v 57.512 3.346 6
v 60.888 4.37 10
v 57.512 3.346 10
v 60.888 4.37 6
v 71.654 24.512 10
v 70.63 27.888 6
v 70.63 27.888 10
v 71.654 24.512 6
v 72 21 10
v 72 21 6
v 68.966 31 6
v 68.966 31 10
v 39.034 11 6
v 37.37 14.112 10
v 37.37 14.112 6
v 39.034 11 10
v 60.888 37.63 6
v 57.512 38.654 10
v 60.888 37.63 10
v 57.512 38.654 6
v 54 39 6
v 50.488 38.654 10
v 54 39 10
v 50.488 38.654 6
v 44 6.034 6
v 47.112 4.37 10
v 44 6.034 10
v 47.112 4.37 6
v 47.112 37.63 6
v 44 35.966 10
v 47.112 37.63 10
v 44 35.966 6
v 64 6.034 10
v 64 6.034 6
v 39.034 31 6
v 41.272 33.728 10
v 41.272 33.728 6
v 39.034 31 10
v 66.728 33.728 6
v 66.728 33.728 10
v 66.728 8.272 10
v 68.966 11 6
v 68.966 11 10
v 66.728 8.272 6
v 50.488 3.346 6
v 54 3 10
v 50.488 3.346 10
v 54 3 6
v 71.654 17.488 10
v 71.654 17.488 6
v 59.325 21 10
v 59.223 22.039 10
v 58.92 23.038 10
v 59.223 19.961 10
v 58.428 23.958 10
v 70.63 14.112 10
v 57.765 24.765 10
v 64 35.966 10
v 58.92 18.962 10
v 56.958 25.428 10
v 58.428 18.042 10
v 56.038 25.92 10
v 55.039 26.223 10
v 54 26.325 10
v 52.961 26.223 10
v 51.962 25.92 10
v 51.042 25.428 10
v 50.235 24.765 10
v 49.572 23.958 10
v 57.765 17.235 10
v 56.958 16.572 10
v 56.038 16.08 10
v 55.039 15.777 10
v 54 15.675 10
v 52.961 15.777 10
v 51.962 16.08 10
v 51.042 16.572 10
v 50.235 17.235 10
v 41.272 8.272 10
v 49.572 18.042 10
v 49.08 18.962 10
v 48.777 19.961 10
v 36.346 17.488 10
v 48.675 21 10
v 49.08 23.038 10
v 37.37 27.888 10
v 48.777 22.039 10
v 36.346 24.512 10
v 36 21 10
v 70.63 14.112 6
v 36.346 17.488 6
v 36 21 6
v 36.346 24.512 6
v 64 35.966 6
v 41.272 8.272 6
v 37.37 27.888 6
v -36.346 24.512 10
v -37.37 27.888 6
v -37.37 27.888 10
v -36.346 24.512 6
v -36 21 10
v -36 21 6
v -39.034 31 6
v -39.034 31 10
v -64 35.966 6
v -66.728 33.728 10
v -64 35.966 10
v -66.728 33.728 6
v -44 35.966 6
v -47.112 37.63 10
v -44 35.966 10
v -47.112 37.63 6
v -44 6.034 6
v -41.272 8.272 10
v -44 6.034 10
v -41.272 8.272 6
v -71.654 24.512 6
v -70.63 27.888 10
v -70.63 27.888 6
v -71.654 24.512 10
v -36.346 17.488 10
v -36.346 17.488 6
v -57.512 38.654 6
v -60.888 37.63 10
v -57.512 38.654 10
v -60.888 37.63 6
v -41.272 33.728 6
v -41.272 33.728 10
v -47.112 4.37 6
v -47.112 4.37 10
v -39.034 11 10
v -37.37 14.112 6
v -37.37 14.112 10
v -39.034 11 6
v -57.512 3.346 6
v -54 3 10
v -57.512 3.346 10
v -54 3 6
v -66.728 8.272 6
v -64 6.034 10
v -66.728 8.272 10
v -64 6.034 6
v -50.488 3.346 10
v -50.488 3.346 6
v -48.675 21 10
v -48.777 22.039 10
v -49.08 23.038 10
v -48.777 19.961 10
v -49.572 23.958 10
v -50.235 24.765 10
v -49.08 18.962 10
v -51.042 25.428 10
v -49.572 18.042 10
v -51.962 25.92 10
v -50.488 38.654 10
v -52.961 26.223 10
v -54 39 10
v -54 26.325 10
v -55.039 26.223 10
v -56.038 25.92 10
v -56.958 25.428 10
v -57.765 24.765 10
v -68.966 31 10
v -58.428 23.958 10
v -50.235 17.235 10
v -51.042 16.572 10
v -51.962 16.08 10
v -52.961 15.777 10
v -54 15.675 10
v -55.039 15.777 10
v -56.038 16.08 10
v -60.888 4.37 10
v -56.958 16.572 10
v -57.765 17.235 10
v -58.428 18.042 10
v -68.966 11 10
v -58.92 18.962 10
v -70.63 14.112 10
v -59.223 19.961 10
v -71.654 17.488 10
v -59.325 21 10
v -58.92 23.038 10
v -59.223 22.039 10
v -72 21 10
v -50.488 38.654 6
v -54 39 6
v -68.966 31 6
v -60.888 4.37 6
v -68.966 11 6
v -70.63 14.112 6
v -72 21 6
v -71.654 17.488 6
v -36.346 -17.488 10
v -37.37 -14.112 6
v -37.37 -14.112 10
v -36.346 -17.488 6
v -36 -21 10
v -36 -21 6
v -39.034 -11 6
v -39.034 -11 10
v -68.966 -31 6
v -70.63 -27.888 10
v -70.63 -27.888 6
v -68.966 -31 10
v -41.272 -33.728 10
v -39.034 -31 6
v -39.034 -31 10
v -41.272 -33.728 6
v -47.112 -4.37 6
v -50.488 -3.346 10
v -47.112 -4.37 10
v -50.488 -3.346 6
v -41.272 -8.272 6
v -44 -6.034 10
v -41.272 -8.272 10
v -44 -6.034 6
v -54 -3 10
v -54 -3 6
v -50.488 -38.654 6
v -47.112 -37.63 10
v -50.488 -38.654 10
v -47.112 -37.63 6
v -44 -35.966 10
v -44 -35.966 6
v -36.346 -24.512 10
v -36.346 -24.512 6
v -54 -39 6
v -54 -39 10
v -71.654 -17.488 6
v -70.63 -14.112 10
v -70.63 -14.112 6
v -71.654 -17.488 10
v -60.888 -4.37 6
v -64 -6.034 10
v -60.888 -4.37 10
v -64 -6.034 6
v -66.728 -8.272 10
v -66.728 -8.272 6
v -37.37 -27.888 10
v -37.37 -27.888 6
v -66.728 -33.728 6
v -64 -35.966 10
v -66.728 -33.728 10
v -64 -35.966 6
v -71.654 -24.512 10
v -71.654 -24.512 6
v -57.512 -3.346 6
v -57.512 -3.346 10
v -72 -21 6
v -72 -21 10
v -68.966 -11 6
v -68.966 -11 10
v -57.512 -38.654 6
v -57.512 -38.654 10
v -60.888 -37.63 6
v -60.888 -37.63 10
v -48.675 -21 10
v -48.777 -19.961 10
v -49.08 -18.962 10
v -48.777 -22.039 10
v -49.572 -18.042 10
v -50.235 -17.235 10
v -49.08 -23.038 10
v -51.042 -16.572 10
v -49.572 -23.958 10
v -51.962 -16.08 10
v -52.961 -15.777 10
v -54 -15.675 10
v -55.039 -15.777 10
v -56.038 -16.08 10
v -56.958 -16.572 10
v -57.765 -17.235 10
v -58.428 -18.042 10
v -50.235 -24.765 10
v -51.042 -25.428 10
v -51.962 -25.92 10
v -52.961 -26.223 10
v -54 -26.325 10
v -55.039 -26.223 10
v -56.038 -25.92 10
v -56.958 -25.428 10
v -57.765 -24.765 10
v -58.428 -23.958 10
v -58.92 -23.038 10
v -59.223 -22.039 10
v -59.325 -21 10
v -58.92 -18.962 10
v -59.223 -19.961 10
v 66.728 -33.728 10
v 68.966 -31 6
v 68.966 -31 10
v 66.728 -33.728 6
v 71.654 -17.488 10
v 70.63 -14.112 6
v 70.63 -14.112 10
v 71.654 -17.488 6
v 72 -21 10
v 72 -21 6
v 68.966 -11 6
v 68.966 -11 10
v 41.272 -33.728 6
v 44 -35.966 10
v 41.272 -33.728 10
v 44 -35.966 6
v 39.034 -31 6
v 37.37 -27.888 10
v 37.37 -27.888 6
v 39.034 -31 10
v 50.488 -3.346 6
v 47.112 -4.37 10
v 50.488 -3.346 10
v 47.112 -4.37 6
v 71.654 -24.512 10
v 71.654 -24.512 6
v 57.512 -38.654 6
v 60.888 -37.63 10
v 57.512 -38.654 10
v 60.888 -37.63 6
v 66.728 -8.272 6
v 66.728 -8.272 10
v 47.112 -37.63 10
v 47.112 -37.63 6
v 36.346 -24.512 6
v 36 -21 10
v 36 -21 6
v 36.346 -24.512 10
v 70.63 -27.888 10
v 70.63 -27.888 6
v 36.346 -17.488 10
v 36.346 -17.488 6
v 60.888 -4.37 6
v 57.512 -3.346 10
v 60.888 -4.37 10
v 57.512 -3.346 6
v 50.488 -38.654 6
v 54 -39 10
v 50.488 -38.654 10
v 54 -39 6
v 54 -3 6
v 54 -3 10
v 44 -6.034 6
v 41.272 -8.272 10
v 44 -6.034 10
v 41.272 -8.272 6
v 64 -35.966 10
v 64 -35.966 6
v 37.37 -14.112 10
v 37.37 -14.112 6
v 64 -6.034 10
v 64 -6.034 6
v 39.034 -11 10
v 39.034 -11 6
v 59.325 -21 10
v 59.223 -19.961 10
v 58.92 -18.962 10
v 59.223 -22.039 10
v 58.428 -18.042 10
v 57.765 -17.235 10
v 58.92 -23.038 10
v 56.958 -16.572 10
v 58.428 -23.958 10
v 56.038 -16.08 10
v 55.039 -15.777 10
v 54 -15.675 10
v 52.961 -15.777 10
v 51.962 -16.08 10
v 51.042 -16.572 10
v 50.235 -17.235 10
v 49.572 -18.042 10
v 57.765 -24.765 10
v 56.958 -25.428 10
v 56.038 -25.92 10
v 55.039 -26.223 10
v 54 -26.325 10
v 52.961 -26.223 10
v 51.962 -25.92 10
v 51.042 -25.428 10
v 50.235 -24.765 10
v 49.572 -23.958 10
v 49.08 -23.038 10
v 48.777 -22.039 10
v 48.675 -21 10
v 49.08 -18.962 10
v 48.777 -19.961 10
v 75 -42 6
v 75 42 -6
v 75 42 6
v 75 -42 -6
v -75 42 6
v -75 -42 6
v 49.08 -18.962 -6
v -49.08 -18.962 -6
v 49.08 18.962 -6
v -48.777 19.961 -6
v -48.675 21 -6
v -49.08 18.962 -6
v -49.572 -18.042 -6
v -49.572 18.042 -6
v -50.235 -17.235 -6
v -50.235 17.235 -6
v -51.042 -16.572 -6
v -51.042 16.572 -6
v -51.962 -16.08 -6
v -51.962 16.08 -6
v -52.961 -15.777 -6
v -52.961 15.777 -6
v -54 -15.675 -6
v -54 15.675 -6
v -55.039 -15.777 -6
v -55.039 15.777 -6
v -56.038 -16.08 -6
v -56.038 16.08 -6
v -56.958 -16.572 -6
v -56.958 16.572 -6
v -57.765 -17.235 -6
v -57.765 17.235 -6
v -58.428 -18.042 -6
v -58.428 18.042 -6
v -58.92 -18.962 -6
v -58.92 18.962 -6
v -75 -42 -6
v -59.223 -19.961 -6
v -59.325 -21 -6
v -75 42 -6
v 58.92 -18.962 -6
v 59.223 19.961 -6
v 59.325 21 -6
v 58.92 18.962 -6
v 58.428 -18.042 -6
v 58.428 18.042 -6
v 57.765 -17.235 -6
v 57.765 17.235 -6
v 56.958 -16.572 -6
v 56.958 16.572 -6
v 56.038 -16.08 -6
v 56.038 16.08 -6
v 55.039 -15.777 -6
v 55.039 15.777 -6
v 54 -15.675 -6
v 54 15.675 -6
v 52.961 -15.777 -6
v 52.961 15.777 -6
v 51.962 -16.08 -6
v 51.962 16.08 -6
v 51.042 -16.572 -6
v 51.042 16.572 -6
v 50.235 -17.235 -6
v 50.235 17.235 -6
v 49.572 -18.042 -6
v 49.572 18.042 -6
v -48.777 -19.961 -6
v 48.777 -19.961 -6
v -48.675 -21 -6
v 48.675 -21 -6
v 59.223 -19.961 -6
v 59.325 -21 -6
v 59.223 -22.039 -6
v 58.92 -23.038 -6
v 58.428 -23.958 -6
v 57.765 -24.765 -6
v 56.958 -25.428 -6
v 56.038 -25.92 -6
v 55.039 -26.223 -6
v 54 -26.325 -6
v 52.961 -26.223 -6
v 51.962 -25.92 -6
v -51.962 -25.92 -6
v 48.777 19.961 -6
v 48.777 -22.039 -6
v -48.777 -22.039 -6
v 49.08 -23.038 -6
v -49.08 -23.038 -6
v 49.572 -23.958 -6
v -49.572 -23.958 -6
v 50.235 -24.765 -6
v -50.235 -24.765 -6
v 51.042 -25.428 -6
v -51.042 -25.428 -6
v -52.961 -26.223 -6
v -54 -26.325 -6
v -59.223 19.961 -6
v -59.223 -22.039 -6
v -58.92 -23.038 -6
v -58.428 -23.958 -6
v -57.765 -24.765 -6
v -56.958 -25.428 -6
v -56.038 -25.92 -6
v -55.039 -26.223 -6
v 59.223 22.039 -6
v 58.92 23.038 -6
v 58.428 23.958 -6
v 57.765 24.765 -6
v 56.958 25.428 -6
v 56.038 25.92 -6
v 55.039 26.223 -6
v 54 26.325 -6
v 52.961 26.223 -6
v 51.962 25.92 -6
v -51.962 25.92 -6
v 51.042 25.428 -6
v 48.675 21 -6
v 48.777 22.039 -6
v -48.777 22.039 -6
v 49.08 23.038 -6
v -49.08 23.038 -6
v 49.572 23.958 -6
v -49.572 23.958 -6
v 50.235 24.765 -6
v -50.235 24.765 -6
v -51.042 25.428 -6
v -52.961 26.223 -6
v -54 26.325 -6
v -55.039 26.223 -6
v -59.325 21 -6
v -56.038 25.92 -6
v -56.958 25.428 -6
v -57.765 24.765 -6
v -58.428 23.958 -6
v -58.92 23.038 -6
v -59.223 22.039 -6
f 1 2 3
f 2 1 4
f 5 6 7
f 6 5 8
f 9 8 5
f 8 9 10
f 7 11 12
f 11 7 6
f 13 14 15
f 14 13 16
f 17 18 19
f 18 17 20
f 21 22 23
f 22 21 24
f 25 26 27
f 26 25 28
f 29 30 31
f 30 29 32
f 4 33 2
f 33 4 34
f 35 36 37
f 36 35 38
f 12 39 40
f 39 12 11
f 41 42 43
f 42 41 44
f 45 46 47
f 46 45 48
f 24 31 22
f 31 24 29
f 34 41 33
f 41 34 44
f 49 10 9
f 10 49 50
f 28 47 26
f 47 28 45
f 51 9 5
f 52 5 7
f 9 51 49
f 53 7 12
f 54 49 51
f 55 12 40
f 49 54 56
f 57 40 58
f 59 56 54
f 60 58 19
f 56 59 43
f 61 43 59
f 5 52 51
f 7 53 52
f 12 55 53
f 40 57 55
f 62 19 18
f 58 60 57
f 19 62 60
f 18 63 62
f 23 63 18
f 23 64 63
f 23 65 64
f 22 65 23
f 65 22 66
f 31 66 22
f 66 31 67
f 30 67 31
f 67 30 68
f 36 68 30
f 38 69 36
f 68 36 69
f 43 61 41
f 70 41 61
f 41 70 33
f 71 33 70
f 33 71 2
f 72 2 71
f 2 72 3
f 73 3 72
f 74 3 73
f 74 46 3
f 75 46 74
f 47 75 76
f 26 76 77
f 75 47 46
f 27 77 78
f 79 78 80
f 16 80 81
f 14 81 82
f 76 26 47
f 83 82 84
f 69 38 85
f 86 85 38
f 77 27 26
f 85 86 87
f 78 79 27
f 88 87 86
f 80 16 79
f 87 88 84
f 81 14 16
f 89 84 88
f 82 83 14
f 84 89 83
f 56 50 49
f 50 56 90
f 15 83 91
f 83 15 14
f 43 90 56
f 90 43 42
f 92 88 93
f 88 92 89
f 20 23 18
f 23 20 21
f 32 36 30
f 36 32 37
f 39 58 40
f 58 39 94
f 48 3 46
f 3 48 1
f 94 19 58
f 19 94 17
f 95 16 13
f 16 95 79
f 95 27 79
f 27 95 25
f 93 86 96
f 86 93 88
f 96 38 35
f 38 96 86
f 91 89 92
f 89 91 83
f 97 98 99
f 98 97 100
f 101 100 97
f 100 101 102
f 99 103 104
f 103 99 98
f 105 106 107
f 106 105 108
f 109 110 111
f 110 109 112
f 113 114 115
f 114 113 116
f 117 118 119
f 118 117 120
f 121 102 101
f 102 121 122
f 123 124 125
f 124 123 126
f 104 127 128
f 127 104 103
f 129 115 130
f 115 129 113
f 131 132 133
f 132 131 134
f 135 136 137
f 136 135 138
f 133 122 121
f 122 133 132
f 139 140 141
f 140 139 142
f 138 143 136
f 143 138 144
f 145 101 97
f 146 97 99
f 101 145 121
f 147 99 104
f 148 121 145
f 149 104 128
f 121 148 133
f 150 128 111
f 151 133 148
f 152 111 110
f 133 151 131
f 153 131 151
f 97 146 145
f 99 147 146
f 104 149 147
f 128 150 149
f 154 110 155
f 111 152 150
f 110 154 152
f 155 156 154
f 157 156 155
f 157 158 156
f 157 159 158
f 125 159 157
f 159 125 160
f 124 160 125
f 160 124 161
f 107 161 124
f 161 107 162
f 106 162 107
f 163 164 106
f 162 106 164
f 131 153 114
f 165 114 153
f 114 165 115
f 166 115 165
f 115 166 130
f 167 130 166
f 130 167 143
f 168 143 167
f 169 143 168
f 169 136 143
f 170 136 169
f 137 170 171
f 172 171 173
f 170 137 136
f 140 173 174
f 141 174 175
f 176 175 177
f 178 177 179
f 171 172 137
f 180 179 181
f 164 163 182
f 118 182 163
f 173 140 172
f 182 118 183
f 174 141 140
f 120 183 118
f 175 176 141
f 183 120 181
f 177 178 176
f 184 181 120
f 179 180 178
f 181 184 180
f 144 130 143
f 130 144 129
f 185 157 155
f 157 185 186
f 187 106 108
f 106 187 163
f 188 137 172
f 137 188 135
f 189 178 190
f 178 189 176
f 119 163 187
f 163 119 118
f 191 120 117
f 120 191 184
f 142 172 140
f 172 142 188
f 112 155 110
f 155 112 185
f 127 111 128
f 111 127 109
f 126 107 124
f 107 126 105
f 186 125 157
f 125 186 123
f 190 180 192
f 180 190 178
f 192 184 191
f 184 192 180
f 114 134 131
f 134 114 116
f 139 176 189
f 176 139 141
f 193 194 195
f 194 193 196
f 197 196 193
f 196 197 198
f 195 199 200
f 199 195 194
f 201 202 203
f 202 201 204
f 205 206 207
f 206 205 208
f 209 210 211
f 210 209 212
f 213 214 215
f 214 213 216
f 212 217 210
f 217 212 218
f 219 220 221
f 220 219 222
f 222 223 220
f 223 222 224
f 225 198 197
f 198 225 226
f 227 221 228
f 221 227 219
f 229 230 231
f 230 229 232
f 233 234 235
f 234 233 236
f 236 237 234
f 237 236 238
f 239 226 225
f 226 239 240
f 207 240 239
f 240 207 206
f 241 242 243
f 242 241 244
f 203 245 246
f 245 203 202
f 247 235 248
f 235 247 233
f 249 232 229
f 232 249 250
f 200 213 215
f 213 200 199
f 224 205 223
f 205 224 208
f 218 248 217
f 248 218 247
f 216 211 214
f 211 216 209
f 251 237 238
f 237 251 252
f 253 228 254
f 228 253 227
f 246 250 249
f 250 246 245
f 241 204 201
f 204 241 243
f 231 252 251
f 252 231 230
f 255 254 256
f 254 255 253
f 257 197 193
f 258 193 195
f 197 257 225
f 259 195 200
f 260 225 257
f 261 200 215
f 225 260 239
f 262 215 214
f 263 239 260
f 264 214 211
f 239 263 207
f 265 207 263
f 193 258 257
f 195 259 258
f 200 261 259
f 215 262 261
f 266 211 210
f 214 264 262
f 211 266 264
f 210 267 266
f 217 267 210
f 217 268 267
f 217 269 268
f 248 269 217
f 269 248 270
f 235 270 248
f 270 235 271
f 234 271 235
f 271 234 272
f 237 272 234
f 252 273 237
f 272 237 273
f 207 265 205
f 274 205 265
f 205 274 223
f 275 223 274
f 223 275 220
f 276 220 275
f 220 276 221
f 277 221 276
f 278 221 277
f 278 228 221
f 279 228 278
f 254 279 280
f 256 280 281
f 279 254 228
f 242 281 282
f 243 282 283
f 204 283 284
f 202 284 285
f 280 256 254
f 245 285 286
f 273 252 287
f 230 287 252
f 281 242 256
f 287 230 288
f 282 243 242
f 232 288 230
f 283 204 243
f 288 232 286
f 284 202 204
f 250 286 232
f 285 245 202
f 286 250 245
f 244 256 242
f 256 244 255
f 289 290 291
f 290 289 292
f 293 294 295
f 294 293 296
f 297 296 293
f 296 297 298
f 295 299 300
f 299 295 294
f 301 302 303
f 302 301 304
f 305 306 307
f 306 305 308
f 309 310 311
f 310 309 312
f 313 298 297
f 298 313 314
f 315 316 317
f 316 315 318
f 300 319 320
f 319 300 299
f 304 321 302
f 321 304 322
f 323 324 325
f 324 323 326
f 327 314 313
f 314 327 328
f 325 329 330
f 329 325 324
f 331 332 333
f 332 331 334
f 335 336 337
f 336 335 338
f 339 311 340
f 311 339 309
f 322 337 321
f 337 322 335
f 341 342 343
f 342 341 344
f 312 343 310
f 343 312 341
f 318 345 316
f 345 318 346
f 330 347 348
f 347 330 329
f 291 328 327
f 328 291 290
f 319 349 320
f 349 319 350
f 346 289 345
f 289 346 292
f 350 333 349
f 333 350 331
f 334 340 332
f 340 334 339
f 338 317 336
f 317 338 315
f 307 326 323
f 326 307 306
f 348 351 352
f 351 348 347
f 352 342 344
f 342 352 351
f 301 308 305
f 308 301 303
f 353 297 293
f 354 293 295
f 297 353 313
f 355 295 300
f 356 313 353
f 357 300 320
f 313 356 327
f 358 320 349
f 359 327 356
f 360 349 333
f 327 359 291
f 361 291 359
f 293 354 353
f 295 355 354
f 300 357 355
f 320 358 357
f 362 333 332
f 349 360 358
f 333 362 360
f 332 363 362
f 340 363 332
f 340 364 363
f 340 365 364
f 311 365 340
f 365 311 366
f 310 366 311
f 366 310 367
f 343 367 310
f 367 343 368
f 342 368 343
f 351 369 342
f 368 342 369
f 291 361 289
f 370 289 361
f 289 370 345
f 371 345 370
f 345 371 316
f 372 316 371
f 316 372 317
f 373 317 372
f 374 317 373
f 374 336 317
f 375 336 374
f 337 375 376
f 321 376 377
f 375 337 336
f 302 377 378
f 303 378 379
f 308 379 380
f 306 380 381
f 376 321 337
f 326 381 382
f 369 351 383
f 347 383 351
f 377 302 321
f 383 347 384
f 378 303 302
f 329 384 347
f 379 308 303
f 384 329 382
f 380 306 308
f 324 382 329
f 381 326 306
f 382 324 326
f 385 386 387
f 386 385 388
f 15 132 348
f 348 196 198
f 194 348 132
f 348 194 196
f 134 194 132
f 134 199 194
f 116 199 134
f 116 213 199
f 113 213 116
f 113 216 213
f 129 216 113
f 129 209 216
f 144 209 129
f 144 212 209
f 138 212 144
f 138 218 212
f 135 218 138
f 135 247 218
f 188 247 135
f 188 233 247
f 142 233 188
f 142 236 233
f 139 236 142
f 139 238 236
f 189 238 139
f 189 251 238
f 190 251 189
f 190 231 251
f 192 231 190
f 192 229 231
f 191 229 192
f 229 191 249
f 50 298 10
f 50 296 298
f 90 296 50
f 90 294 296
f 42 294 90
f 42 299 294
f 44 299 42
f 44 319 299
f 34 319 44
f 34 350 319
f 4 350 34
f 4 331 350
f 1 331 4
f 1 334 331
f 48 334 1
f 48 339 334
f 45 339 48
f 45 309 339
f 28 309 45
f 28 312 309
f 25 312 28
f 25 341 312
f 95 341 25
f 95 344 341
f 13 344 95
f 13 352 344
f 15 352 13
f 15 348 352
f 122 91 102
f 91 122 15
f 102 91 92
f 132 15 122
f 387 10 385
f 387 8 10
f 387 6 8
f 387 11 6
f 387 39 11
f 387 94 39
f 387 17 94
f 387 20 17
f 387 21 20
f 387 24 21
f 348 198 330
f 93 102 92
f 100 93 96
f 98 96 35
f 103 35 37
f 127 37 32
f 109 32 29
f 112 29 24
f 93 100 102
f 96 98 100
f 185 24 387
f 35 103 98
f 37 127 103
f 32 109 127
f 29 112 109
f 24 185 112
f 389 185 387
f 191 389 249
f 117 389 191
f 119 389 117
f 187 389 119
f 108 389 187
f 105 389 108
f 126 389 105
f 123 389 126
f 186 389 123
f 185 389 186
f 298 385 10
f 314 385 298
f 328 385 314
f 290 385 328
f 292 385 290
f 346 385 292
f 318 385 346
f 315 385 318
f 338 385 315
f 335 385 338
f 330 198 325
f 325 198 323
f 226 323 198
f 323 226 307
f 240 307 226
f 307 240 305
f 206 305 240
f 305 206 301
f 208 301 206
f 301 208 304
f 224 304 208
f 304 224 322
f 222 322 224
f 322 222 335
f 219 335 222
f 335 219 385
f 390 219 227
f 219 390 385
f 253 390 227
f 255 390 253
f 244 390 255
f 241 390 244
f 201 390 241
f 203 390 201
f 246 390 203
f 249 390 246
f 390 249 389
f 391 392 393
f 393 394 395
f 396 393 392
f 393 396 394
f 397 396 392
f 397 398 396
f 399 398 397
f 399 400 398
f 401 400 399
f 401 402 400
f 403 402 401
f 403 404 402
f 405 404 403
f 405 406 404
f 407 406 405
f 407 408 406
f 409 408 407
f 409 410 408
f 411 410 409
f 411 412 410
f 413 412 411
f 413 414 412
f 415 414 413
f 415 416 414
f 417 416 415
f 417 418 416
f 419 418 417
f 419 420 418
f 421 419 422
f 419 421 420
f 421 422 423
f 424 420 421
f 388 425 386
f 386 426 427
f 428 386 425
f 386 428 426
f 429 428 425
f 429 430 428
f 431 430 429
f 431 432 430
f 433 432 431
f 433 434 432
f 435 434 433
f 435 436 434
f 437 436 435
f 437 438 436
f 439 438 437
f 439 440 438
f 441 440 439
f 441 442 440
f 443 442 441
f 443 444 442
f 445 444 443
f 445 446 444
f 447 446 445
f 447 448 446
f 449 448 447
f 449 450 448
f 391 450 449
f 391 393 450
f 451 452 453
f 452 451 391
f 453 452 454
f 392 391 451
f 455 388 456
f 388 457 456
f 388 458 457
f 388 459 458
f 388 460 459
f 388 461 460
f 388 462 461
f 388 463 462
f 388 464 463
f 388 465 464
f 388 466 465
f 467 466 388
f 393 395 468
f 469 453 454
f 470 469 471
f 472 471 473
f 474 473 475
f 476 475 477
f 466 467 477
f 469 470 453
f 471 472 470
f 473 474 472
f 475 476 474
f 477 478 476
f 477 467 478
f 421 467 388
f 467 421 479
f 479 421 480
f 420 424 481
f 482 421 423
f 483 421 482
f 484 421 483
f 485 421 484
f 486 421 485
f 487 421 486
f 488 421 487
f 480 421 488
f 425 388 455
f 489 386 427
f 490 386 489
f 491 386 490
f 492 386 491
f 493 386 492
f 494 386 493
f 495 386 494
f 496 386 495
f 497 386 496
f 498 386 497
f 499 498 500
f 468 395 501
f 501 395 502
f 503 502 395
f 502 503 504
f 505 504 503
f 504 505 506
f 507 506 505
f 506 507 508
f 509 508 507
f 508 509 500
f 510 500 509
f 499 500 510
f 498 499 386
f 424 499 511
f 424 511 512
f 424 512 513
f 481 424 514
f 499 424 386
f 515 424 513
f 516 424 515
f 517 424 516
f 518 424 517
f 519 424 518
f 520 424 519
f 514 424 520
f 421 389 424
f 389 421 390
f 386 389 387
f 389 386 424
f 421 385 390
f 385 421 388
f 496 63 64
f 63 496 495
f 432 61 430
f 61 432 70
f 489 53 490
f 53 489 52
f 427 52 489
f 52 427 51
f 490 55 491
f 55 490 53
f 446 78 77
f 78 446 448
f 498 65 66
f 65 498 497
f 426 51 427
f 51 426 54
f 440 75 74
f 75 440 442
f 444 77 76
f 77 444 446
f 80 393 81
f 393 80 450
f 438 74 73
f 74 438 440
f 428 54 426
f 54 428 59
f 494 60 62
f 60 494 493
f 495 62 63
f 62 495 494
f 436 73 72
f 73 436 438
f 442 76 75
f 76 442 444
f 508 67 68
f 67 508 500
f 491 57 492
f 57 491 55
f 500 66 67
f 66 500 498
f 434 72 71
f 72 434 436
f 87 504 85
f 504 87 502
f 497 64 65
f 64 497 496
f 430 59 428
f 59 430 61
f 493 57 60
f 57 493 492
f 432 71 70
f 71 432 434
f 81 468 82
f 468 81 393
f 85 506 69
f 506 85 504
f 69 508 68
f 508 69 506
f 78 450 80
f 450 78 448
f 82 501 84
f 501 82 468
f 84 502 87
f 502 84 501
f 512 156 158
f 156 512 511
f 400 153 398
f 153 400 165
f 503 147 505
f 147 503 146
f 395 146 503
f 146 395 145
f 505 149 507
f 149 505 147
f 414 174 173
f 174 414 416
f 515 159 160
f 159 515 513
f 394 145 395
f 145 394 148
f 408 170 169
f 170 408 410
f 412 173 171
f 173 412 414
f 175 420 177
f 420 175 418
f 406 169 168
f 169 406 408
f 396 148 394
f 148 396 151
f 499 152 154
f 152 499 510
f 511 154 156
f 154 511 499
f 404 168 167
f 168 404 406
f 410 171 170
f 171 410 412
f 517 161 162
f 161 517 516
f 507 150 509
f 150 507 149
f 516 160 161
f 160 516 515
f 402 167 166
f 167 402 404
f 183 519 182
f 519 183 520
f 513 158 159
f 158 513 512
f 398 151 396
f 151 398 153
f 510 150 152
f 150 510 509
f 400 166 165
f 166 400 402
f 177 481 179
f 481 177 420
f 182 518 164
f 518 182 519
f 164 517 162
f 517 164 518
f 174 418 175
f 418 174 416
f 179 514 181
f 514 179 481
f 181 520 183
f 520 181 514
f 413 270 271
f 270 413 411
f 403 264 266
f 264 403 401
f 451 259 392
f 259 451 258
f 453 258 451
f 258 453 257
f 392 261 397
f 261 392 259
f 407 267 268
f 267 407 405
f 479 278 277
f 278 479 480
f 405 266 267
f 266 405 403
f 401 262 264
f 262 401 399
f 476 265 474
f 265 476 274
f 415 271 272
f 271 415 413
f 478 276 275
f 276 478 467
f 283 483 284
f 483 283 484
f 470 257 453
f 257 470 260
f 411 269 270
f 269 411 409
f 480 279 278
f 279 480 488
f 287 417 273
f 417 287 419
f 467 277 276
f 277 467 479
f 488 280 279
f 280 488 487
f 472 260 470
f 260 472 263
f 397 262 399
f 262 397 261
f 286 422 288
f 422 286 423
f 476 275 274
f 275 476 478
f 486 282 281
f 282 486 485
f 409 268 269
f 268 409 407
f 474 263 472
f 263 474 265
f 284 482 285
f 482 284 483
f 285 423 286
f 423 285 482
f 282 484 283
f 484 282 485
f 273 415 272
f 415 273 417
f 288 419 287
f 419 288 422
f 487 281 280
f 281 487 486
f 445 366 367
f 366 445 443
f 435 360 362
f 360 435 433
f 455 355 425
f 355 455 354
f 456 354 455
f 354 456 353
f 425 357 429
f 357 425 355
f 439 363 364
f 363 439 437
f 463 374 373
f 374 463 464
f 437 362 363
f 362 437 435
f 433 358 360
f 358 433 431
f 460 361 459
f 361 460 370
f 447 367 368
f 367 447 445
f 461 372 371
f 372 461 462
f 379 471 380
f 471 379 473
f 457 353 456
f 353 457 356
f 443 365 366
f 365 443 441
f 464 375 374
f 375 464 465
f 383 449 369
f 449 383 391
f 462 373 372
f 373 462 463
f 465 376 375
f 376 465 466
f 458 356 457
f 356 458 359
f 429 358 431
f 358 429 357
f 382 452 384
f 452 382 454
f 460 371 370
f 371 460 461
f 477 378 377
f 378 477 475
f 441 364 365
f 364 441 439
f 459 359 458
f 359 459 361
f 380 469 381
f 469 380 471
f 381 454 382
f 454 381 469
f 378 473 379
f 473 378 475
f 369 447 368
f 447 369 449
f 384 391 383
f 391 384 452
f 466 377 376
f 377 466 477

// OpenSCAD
$fn = 32;

// ----------------------------------------------------------------------
// Anchor pads 150 x 84 x 16
// four corner bosses with anchor holes
// ----------------------------------------------------------------------

// --- parameters (mm) ---
plate = [150, 84, 12];   // base plate size (x, y, z)
pads = 4;                // boss count, one per corner
edge = 21;               // boss centre offset from the plate edge
boss_d = 36;             // boss diameter
boss_h = 4;              // boss height above the base plate
bore_d = 10.5;           // nominal hole diameter from the drawing
print_allowance = 0.15;  // clearance added for printing

// --- derived feature positions (mm) ---
hole_d = bore_d + print_allowance;  // = 10.65   hole diameter as printed
height = plate[2] + boss_h;         // = 16   overall height of the part
corner_x = plate[0] / 2 - edge;     // = 54   boss centre X
corner_y = plate[1] / 2 - edge;     // = 21   boss centre Y
feature_centers = [
  [corner_x, corner_y],
  [-corner_x, corner_y],
  [-corner_x, -corner_y],
  [corner_x, -corner_y]
];   // boss centres, anchor holes are drilled there

// base plate, four bosses standing on it, anchor holes all the way through
difference() {
  union() {
    cube(plate, center = true);
    for (centre = feature_centers)
      translate([centre[0], centre[1], plate[2] / 2 - 1])
        cylinder(d = boss_d, h = boss_h + 1);
  }
  for (centre = feature_centers)
    translate([centre[0], centre[1], -height])
      cylinder(d = hole_d, h = 2 * height + 2);  // through boss and plate
}
